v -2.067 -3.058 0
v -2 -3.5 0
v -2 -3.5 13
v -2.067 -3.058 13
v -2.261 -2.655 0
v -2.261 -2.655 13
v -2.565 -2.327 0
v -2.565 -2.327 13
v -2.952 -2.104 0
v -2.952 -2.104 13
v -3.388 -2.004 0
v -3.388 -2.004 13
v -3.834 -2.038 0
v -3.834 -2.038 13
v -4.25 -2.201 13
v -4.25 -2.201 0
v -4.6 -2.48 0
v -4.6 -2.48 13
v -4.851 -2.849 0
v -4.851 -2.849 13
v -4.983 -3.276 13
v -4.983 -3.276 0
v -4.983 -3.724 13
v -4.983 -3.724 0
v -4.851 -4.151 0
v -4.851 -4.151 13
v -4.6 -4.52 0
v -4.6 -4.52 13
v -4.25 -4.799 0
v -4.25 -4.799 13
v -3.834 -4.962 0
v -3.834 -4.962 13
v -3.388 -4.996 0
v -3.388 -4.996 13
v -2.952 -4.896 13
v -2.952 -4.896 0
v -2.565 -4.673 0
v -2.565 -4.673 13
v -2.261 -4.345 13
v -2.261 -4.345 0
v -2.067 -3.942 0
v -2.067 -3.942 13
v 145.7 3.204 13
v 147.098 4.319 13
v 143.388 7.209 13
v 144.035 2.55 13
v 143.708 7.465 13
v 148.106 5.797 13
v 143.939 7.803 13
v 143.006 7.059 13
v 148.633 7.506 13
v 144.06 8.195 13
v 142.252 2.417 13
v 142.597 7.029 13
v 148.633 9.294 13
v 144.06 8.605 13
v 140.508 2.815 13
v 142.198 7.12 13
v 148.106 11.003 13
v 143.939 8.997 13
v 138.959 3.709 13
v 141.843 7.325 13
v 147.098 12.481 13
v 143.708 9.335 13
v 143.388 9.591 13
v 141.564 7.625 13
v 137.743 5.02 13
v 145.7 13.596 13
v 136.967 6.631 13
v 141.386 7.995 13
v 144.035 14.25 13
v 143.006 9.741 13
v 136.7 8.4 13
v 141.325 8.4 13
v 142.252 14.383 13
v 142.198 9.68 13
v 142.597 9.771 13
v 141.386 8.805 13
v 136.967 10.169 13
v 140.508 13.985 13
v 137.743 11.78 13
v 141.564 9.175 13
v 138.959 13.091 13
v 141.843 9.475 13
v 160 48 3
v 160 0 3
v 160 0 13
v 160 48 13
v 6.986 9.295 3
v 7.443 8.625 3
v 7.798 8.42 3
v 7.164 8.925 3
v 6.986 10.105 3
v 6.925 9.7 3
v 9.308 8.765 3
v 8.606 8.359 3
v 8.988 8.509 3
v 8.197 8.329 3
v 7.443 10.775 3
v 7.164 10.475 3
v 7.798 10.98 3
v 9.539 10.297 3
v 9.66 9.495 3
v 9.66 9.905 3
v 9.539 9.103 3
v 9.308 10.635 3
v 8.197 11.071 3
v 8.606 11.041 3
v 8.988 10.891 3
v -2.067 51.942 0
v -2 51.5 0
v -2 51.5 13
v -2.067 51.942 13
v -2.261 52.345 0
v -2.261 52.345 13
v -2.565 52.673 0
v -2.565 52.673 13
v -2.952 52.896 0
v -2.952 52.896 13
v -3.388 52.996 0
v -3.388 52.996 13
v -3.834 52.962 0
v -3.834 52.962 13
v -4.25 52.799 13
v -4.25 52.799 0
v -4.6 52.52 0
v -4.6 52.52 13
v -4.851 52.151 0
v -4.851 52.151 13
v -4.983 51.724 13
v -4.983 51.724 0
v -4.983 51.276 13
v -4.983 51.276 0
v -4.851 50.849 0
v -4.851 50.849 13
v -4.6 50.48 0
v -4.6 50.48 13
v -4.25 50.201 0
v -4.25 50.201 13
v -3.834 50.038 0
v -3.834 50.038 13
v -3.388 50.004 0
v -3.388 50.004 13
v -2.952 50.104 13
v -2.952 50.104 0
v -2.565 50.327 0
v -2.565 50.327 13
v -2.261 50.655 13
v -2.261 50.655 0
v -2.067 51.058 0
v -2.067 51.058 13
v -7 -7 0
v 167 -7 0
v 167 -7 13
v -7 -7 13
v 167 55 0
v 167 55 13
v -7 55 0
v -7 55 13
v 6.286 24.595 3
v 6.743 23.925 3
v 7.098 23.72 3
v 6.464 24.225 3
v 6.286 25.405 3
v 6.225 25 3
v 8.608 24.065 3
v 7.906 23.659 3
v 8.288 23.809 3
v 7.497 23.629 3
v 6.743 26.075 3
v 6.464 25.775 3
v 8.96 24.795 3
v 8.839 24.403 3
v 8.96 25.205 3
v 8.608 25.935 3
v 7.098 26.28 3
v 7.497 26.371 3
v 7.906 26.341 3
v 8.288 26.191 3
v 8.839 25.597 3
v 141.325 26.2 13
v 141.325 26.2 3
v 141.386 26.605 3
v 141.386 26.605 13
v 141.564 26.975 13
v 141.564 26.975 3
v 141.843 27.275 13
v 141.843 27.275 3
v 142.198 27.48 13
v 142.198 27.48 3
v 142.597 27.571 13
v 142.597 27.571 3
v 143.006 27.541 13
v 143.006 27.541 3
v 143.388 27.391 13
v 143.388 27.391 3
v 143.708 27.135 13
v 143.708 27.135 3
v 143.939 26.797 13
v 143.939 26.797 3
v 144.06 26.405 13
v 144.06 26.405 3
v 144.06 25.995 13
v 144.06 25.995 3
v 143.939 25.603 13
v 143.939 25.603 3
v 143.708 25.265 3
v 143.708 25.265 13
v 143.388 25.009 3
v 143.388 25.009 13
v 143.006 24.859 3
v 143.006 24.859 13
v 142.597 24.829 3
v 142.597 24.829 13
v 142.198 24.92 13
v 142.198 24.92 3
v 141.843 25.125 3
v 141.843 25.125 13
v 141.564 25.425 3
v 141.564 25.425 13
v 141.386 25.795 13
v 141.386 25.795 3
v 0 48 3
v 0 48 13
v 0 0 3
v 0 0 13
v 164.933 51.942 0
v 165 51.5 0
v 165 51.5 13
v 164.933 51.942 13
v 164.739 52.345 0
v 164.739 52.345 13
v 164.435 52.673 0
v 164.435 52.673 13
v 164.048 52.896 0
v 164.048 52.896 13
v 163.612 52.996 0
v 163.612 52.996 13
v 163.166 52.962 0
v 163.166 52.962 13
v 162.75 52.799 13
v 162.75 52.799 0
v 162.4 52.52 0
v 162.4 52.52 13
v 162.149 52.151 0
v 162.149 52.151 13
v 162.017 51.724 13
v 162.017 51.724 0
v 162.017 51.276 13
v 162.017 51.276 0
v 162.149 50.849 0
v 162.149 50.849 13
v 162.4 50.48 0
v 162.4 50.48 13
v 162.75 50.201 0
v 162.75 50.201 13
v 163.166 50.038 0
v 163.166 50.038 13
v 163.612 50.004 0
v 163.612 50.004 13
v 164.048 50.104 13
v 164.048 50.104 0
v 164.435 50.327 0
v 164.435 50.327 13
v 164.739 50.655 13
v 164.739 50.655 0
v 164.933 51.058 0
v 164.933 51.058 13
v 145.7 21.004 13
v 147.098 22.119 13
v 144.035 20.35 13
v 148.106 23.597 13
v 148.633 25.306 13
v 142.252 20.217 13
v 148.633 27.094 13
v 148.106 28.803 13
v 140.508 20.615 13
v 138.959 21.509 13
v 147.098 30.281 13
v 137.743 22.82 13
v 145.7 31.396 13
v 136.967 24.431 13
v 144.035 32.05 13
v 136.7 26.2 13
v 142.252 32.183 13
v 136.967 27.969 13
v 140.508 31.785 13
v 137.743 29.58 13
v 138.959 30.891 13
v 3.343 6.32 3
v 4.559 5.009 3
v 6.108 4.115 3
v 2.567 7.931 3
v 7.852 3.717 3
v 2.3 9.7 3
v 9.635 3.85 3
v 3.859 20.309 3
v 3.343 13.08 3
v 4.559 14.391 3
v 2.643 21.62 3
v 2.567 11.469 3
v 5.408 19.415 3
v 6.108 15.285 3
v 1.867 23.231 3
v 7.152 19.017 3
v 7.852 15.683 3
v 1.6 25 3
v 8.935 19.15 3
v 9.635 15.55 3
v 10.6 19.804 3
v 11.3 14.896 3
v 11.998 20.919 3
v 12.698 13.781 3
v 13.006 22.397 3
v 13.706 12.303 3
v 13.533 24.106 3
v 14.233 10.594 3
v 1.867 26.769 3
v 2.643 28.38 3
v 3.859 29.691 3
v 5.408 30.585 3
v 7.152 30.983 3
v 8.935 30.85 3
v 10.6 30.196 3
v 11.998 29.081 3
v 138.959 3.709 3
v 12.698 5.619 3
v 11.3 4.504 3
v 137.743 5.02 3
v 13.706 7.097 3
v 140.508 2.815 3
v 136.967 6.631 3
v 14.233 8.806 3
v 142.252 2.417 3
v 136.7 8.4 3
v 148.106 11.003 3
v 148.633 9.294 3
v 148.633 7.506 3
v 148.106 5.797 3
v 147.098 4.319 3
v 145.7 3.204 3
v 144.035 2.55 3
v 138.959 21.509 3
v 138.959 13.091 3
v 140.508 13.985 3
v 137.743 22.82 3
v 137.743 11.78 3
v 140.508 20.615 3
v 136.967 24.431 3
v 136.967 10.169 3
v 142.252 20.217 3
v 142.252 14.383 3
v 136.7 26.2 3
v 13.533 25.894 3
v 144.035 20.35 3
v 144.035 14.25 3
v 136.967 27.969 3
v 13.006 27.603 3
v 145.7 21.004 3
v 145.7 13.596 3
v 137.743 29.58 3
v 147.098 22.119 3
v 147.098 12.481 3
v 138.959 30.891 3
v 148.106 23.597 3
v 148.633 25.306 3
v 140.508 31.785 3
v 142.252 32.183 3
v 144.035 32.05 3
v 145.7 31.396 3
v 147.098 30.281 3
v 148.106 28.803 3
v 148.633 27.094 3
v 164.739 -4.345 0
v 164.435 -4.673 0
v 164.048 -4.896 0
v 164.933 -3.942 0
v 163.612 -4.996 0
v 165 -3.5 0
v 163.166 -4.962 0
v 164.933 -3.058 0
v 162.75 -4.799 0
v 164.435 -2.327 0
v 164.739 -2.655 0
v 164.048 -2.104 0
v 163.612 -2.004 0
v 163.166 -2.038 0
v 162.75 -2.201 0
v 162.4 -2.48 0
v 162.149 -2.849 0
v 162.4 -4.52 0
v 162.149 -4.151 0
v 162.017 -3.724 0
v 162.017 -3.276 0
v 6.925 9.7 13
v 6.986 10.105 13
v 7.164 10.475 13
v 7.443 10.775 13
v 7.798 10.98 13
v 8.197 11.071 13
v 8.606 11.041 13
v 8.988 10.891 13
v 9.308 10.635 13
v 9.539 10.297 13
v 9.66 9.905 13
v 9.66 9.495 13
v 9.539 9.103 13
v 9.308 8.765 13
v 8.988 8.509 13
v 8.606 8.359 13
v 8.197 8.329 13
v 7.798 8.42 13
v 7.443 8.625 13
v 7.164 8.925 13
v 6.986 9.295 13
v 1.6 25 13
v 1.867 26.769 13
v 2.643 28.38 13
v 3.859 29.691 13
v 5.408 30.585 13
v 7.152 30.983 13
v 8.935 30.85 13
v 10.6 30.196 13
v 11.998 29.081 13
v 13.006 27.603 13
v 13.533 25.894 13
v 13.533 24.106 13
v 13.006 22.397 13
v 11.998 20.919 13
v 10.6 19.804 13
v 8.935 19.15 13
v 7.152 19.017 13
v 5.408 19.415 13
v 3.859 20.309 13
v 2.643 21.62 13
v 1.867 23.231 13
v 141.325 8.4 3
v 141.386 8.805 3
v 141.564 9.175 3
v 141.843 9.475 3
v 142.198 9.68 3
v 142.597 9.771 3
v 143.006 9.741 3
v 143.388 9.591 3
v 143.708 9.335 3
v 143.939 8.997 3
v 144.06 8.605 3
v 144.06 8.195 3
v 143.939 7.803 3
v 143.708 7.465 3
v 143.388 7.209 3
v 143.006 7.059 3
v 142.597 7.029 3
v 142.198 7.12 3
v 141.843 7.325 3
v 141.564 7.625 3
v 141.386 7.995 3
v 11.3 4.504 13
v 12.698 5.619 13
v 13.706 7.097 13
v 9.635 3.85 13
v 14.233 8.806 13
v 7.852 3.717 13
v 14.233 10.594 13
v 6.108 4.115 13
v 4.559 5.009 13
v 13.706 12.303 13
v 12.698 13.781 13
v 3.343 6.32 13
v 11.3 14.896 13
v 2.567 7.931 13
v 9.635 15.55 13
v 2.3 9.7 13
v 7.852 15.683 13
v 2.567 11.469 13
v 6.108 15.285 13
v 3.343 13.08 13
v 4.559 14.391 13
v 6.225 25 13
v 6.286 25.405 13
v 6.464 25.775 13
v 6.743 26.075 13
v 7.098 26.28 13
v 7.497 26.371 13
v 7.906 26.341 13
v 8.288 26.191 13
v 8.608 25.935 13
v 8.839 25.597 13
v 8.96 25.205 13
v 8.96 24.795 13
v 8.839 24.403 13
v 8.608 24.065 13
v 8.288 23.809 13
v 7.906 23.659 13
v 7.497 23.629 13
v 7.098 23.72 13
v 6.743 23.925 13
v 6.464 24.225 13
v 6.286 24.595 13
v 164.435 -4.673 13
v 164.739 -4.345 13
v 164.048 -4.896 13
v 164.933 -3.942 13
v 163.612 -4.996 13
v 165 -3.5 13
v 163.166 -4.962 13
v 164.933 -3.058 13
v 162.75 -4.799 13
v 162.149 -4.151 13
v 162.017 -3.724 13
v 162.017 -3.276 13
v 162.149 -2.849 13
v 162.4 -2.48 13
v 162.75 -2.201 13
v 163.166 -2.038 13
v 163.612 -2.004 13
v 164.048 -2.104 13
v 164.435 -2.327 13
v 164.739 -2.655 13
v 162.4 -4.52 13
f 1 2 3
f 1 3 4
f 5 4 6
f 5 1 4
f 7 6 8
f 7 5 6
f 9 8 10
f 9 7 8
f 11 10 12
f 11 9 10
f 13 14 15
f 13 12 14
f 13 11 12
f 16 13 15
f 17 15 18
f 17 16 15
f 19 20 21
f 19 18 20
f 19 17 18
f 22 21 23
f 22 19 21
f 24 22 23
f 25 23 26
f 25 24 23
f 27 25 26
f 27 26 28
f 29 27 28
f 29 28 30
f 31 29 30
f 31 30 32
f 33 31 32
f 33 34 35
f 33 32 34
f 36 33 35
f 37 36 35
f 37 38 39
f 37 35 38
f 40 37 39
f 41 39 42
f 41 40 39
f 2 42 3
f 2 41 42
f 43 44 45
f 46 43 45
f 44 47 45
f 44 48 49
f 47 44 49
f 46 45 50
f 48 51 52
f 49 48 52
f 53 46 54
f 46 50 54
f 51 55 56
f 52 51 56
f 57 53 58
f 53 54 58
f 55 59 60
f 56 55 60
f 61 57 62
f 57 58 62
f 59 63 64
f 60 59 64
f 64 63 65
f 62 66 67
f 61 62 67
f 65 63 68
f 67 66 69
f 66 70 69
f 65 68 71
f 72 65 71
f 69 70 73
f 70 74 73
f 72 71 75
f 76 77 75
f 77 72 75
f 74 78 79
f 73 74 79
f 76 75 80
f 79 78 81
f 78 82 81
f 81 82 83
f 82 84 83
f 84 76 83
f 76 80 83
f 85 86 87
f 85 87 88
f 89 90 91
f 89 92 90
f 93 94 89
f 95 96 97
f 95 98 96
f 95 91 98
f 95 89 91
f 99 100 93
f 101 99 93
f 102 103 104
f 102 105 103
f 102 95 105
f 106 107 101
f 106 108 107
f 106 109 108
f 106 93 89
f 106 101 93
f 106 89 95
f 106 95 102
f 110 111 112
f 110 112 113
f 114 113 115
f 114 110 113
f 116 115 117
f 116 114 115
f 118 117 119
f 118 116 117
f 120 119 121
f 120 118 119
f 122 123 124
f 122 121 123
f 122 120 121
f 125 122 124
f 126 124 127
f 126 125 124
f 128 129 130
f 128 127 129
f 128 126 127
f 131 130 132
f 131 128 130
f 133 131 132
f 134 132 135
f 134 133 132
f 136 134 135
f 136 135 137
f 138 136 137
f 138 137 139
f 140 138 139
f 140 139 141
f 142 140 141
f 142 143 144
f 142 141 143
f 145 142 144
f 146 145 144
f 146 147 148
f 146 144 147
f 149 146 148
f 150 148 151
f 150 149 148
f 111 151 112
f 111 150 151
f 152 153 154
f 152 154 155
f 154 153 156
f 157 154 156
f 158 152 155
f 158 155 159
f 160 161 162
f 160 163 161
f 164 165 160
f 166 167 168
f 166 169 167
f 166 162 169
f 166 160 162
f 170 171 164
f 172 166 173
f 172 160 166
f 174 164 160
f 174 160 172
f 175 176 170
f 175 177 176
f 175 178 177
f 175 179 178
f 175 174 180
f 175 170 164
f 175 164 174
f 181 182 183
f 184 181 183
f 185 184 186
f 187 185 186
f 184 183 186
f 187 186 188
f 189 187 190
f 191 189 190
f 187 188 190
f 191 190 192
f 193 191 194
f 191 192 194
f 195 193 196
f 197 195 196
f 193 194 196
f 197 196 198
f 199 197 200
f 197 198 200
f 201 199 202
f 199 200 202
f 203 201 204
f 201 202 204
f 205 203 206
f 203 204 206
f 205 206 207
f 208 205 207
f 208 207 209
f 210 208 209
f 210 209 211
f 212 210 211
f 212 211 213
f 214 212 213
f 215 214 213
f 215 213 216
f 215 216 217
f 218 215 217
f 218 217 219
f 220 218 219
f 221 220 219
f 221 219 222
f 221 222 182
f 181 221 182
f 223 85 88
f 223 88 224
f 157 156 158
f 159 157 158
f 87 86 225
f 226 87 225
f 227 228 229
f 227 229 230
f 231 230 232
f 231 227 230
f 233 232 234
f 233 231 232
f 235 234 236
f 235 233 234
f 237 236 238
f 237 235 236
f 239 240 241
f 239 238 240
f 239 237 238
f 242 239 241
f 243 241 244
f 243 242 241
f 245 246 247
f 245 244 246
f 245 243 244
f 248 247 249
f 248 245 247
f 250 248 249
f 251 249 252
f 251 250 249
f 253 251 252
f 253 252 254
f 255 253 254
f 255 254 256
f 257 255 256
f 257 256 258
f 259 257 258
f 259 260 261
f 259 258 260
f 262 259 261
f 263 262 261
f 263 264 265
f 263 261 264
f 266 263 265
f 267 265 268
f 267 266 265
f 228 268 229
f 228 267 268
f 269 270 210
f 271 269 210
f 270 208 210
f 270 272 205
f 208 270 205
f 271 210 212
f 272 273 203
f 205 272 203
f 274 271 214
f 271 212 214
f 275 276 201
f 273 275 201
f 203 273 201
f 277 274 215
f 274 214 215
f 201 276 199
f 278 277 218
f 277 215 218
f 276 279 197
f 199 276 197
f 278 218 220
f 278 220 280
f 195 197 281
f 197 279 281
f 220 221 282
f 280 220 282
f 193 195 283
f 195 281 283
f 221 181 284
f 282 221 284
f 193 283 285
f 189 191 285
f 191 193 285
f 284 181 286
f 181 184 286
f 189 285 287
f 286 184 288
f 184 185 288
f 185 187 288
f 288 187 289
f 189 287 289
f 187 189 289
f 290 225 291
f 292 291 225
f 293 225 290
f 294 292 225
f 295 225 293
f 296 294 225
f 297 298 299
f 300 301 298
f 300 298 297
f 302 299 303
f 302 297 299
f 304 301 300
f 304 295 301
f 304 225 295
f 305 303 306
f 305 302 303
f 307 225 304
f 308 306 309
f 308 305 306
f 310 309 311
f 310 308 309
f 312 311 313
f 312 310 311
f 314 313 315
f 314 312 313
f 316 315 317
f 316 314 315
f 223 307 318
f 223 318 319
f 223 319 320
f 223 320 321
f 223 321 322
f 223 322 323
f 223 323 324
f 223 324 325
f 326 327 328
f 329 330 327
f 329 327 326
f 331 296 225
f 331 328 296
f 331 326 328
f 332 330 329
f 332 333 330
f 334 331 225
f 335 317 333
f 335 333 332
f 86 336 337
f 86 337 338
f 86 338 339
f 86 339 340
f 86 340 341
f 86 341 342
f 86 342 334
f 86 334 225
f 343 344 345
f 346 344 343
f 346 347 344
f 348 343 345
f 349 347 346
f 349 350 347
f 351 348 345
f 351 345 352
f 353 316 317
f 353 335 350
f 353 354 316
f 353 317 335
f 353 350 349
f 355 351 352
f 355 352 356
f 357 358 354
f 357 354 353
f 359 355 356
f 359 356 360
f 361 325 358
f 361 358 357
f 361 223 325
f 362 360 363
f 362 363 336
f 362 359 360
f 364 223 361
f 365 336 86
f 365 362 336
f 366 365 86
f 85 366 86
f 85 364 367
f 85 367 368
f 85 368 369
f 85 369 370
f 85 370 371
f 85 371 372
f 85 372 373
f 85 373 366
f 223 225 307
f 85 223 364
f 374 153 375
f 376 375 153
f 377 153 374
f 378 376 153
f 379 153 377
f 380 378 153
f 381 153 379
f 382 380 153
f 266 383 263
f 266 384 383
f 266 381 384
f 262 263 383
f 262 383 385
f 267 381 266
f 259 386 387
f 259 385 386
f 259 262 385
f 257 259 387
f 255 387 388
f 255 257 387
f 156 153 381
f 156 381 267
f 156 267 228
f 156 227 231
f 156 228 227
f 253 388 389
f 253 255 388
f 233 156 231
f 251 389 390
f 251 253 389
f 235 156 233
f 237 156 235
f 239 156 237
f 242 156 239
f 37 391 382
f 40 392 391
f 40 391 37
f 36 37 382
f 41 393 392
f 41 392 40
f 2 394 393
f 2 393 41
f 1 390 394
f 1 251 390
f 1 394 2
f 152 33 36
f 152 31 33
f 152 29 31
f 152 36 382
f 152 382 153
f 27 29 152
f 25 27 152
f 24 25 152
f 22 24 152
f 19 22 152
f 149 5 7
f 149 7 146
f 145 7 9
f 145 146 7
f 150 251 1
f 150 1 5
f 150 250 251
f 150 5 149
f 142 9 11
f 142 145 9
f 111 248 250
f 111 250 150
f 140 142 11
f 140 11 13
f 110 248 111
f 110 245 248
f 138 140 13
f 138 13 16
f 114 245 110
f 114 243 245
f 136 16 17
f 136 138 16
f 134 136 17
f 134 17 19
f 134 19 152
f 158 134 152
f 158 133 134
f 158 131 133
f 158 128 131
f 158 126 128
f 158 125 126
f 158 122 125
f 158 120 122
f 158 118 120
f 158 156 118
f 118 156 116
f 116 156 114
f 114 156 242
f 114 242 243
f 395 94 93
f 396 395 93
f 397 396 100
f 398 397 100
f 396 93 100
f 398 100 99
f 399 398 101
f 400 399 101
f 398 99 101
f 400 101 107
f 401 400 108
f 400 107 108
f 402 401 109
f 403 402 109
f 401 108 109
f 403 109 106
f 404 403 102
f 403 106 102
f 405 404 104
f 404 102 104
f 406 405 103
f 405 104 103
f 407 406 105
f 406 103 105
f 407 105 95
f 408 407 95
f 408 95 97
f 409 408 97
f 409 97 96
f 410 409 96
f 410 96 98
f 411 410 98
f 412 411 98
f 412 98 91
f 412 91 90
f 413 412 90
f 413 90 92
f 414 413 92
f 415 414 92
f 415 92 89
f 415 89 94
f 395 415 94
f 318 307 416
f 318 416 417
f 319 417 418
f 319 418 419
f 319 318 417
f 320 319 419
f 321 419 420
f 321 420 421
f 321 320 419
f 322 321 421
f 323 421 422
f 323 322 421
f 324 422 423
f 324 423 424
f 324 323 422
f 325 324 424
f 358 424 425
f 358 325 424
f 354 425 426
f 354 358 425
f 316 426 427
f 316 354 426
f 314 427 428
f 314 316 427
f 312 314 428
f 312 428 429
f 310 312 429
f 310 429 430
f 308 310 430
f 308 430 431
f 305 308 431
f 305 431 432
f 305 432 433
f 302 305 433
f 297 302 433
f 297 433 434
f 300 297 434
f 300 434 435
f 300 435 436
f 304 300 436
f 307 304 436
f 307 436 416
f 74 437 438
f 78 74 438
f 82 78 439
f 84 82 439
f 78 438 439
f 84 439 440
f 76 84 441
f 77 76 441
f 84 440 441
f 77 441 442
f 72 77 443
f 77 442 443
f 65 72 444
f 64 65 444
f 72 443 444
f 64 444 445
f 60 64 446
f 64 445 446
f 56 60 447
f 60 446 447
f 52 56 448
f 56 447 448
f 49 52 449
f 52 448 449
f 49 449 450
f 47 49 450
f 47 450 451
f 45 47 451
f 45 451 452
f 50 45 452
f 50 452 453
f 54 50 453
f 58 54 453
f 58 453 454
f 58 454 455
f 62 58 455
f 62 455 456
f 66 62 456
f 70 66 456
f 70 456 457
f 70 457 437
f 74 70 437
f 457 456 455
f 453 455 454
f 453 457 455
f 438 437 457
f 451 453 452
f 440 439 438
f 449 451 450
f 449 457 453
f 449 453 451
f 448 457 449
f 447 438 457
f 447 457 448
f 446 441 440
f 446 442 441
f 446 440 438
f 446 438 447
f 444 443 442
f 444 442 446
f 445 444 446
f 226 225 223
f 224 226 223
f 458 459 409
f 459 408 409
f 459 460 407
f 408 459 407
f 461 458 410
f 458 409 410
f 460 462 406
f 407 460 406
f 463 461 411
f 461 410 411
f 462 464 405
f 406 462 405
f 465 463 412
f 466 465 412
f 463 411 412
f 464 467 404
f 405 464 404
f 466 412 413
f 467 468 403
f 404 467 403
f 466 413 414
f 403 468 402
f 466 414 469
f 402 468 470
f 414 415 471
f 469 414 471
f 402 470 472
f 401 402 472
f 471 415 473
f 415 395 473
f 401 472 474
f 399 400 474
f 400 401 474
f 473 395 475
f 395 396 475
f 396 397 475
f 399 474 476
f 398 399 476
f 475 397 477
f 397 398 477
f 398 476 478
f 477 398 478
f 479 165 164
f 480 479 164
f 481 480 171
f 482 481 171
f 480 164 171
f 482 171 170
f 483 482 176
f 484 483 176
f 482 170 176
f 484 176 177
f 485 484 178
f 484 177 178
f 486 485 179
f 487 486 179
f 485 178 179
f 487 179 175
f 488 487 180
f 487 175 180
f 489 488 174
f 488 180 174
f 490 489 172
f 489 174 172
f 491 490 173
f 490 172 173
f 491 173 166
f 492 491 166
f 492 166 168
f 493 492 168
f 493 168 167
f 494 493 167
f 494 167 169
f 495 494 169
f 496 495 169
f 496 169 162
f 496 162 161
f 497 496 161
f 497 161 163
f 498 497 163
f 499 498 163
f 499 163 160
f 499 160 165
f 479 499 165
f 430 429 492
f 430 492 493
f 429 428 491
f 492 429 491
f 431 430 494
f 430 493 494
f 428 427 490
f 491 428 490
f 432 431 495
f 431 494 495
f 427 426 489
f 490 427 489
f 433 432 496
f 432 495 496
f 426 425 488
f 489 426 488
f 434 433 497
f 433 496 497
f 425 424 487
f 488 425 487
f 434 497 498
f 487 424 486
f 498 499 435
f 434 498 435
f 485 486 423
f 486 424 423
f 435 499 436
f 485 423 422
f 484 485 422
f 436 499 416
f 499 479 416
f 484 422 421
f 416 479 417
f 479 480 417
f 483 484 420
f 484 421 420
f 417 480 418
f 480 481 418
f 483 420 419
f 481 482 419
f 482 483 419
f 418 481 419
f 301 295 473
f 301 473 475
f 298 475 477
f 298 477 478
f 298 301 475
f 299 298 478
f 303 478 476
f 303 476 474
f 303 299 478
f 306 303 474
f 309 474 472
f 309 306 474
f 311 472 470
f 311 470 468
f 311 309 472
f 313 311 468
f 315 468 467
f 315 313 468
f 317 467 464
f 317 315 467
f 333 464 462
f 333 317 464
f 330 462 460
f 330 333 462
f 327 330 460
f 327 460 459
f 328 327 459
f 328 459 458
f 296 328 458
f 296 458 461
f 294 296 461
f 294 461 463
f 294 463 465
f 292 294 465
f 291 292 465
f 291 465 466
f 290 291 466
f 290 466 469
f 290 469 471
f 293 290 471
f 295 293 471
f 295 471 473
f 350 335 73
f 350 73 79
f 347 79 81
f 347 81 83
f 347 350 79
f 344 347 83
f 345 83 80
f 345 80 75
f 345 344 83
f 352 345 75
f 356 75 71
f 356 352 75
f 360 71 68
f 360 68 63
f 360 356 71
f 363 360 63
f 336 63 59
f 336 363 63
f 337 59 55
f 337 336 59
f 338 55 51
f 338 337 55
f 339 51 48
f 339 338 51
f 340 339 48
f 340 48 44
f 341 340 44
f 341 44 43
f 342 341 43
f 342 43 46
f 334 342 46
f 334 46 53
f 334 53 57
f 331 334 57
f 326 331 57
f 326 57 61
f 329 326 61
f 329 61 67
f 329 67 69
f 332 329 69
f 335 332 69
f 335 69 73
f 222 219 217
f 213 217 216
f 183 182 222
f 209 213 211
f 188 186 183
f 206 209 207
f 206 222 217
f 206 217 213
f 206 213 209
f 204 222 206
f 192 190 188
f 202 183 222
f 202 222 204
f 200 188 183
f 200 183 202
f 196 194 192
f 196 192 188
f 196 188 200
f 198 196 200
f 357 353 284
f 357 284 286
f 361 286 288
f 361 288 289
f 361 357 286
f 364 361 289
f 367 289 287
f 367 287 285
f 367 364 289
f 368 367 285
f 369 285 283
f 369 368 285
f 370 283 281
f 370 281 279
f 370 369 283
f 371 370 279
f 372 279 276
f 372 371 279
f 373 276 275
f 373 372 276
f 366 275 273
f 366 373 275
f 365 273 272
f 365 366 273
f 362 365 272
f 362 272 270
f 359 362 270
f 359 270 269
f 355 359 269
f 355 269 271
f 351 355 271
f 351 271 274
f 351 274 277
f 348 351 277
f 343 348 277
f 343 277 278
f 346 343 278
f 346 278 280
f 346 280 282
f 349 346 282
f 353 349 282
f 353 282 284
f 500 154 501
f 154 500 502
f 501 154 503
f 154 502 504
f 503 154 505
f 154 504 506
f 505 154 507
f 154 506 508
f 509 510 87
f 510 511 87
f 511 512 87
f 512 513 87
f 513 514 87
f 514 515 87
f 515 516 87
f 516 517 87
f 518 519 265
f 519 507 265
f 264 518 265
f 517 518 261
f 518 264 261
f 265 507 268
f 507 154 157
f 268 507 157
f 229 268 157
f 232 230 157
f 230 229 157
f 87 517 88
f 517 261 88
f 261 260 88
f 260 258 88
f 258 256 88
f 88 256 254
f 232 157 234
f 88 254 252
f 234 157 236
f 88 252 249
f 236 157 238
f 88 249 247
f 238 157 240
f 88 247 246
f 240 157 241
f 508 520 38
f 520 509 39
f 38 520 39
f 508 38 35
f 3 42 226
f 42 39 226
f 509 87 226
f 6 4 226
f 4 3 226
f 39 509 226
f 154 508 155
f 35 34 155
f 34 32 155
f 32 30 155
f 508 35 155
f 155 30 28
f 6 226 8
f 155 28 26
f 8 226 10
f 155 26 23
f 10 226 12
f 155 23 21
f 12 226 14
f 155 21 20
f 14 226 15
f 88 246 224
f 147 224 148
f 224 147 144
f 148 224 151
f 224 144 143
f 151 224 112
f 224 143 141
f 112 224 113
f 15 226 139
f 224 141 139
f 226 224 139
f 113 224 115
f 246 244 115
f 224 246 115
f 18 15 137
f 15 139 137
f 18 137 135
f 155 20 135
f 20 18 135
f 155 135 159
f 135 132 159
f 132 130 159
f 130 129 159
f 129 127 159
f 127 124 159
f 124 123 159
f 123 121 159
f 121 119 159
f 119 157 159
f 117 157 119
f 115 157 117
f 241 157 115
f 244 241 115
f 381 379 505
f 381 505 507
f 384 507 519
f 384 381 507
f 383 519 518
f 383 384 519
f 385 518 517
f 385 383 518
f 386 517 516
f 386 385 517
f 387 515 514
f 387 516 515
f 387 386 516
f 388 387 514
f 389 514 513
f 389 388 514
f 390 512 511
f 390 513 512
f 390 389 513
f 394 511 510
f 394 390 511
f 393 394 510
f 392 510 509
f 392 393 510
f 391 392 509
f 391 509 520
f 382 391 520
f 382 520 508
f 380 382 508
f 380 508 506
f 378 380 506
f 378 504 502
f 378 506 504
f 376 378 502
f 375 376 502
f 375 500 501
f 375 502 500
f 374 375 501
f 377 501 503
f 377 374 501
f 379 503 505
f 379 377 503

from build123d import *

# Parameters (mm, degrees)
SKICA1_W                      = 160
SKICA1_H                      = 48
P_IDAT_VYSUNUT_M1_DEPTH       = 3
SKICA3_R                      = 6
SKICA3_R_2                    = 1.375
STOJNY_K_PCB_DEPTH            = 13
SKICA5_W                      = 174
SKICA5_H                      = 62
SKICA5_W_2                    = 160
SKICA5_H_2                    = 48
P_IDAT_VYSUNUT_M3_DEPTH       = 13
ODEBRAT_VYSUNUT_M2_DEPTH      = 177.303715219
ODEBRAT_VYSUNUT_M2_DEPTH_BACK = 177.303715219
SKICA7_R                      = 1.5


with BuildPart() as part:
    # Skica1 → Přidat vysunutím1 (new body)
    with BuildSketch(Plane.XY):
        with Locations((80, 24)):
            Rectangle(SKICA1_W, SKICA1_H)
    extrude(amount=P_IDAT_VYSUNUT_M1_DEPTH)

    # Skica3 → stojny k PCB (add)
    # profile 1 of 4: a face of its own
    with BuildSketch(Plane(origin=(0, 0, 0), x_dir=(-1, 0, 0), z_dir=(0, 0, -1))):
        with Locations((-7.6, 25)):
            Circle(SKICA3_R)
        with Locations((-7.6, 25)):
            Circle(SKICA3_R_2, mode=Mode.SUBTRACT)
    # profile 2 of 4: a face of its own
    with BuildSketch(Plane(origin=(0, 0, 0), x_dir=(-1, 0, 0), z_dir=(0, 0, -1))):
        with Locations((-8.3, 9.7)):
            Circle(SKICA3_R)
        with Locations((-8.3, 9.7)):
            Circle(SKICA3_R_2, mode=Mode.SUBTRACT)
    # profile 3 of 4: a face of its own
    with BuildSketch(Plane(origin=(0, 0, 0), x_dir=(-1, 0, 0), z_dir=(0, 0, -1))):
        with Locations((-142.7, 26.2)):
            Circle(SKICA3_R)
        with Locations((-142.7, 26.2)):
            Circle(SKICA3_R_2, mode=Mode.SUBTRACT)
    # profile 4 of 4: a face of its own
    with BuildSketch(Plane(origin=(0, 0, 0), x_dir=(-1, 0, 0), z_dir=(0, 0, -1))):
        with Locations((-142.7, 8.4)):
            Circle(SKICA3_R)
        with Locations((-142.7, 8.4)):
            Circle(SKICA3_R_2, mode=Mode.SUBTRACT)
    extrude(amount=-STOJNY_K_PCB_DEPTH)

    # Skica5 → Přidat vysunutím3 (add)
    with BuildSketch(Plane(origin=(0, 0, 0), x_dir=(-1, 0, 0), z_dir=(0, 0, -1))):
        with Locations((-80, 24)):
            Rectangle(SKICA5_W, SKICA5_H)
        with Locations((-80, 24)):
            Rectangle(SKICA5_W_2, SKICA5_H_2, mode=Mode.SUBTRACT)
    extrude(amount=-P_IDAT_VYSUNUT_M3_DEPTH)

    # Skica7 → Odebrat vysunutím2 (cut, two sides: drawn at the far end of the back side and taken through both)
    with BuildSketch(Plane.XY.offset(13).offset(-ODEBRAT_VYSUNUT_M2_DEPTH_BACK)):
        with Locations((-3.5, -3.5)):
            Circle(SKICA7_R)
        with Locations((-3.5, 51.5)):
            Circle(SKICA7_R)
        with Locations((163.5, -3.5)):
            Circle(SKICA7_R)
        with Locations((163.5, 51.5)):
            Circle(SKICA7_R)
    extrude(amount=ODEBRAT_VYSUNUT_M2_DEPTH + ODEBRAT_VYSUNUT_M2_DEPTH_BACK, mode=Mode.SUBTRACT)


solid = part.part
